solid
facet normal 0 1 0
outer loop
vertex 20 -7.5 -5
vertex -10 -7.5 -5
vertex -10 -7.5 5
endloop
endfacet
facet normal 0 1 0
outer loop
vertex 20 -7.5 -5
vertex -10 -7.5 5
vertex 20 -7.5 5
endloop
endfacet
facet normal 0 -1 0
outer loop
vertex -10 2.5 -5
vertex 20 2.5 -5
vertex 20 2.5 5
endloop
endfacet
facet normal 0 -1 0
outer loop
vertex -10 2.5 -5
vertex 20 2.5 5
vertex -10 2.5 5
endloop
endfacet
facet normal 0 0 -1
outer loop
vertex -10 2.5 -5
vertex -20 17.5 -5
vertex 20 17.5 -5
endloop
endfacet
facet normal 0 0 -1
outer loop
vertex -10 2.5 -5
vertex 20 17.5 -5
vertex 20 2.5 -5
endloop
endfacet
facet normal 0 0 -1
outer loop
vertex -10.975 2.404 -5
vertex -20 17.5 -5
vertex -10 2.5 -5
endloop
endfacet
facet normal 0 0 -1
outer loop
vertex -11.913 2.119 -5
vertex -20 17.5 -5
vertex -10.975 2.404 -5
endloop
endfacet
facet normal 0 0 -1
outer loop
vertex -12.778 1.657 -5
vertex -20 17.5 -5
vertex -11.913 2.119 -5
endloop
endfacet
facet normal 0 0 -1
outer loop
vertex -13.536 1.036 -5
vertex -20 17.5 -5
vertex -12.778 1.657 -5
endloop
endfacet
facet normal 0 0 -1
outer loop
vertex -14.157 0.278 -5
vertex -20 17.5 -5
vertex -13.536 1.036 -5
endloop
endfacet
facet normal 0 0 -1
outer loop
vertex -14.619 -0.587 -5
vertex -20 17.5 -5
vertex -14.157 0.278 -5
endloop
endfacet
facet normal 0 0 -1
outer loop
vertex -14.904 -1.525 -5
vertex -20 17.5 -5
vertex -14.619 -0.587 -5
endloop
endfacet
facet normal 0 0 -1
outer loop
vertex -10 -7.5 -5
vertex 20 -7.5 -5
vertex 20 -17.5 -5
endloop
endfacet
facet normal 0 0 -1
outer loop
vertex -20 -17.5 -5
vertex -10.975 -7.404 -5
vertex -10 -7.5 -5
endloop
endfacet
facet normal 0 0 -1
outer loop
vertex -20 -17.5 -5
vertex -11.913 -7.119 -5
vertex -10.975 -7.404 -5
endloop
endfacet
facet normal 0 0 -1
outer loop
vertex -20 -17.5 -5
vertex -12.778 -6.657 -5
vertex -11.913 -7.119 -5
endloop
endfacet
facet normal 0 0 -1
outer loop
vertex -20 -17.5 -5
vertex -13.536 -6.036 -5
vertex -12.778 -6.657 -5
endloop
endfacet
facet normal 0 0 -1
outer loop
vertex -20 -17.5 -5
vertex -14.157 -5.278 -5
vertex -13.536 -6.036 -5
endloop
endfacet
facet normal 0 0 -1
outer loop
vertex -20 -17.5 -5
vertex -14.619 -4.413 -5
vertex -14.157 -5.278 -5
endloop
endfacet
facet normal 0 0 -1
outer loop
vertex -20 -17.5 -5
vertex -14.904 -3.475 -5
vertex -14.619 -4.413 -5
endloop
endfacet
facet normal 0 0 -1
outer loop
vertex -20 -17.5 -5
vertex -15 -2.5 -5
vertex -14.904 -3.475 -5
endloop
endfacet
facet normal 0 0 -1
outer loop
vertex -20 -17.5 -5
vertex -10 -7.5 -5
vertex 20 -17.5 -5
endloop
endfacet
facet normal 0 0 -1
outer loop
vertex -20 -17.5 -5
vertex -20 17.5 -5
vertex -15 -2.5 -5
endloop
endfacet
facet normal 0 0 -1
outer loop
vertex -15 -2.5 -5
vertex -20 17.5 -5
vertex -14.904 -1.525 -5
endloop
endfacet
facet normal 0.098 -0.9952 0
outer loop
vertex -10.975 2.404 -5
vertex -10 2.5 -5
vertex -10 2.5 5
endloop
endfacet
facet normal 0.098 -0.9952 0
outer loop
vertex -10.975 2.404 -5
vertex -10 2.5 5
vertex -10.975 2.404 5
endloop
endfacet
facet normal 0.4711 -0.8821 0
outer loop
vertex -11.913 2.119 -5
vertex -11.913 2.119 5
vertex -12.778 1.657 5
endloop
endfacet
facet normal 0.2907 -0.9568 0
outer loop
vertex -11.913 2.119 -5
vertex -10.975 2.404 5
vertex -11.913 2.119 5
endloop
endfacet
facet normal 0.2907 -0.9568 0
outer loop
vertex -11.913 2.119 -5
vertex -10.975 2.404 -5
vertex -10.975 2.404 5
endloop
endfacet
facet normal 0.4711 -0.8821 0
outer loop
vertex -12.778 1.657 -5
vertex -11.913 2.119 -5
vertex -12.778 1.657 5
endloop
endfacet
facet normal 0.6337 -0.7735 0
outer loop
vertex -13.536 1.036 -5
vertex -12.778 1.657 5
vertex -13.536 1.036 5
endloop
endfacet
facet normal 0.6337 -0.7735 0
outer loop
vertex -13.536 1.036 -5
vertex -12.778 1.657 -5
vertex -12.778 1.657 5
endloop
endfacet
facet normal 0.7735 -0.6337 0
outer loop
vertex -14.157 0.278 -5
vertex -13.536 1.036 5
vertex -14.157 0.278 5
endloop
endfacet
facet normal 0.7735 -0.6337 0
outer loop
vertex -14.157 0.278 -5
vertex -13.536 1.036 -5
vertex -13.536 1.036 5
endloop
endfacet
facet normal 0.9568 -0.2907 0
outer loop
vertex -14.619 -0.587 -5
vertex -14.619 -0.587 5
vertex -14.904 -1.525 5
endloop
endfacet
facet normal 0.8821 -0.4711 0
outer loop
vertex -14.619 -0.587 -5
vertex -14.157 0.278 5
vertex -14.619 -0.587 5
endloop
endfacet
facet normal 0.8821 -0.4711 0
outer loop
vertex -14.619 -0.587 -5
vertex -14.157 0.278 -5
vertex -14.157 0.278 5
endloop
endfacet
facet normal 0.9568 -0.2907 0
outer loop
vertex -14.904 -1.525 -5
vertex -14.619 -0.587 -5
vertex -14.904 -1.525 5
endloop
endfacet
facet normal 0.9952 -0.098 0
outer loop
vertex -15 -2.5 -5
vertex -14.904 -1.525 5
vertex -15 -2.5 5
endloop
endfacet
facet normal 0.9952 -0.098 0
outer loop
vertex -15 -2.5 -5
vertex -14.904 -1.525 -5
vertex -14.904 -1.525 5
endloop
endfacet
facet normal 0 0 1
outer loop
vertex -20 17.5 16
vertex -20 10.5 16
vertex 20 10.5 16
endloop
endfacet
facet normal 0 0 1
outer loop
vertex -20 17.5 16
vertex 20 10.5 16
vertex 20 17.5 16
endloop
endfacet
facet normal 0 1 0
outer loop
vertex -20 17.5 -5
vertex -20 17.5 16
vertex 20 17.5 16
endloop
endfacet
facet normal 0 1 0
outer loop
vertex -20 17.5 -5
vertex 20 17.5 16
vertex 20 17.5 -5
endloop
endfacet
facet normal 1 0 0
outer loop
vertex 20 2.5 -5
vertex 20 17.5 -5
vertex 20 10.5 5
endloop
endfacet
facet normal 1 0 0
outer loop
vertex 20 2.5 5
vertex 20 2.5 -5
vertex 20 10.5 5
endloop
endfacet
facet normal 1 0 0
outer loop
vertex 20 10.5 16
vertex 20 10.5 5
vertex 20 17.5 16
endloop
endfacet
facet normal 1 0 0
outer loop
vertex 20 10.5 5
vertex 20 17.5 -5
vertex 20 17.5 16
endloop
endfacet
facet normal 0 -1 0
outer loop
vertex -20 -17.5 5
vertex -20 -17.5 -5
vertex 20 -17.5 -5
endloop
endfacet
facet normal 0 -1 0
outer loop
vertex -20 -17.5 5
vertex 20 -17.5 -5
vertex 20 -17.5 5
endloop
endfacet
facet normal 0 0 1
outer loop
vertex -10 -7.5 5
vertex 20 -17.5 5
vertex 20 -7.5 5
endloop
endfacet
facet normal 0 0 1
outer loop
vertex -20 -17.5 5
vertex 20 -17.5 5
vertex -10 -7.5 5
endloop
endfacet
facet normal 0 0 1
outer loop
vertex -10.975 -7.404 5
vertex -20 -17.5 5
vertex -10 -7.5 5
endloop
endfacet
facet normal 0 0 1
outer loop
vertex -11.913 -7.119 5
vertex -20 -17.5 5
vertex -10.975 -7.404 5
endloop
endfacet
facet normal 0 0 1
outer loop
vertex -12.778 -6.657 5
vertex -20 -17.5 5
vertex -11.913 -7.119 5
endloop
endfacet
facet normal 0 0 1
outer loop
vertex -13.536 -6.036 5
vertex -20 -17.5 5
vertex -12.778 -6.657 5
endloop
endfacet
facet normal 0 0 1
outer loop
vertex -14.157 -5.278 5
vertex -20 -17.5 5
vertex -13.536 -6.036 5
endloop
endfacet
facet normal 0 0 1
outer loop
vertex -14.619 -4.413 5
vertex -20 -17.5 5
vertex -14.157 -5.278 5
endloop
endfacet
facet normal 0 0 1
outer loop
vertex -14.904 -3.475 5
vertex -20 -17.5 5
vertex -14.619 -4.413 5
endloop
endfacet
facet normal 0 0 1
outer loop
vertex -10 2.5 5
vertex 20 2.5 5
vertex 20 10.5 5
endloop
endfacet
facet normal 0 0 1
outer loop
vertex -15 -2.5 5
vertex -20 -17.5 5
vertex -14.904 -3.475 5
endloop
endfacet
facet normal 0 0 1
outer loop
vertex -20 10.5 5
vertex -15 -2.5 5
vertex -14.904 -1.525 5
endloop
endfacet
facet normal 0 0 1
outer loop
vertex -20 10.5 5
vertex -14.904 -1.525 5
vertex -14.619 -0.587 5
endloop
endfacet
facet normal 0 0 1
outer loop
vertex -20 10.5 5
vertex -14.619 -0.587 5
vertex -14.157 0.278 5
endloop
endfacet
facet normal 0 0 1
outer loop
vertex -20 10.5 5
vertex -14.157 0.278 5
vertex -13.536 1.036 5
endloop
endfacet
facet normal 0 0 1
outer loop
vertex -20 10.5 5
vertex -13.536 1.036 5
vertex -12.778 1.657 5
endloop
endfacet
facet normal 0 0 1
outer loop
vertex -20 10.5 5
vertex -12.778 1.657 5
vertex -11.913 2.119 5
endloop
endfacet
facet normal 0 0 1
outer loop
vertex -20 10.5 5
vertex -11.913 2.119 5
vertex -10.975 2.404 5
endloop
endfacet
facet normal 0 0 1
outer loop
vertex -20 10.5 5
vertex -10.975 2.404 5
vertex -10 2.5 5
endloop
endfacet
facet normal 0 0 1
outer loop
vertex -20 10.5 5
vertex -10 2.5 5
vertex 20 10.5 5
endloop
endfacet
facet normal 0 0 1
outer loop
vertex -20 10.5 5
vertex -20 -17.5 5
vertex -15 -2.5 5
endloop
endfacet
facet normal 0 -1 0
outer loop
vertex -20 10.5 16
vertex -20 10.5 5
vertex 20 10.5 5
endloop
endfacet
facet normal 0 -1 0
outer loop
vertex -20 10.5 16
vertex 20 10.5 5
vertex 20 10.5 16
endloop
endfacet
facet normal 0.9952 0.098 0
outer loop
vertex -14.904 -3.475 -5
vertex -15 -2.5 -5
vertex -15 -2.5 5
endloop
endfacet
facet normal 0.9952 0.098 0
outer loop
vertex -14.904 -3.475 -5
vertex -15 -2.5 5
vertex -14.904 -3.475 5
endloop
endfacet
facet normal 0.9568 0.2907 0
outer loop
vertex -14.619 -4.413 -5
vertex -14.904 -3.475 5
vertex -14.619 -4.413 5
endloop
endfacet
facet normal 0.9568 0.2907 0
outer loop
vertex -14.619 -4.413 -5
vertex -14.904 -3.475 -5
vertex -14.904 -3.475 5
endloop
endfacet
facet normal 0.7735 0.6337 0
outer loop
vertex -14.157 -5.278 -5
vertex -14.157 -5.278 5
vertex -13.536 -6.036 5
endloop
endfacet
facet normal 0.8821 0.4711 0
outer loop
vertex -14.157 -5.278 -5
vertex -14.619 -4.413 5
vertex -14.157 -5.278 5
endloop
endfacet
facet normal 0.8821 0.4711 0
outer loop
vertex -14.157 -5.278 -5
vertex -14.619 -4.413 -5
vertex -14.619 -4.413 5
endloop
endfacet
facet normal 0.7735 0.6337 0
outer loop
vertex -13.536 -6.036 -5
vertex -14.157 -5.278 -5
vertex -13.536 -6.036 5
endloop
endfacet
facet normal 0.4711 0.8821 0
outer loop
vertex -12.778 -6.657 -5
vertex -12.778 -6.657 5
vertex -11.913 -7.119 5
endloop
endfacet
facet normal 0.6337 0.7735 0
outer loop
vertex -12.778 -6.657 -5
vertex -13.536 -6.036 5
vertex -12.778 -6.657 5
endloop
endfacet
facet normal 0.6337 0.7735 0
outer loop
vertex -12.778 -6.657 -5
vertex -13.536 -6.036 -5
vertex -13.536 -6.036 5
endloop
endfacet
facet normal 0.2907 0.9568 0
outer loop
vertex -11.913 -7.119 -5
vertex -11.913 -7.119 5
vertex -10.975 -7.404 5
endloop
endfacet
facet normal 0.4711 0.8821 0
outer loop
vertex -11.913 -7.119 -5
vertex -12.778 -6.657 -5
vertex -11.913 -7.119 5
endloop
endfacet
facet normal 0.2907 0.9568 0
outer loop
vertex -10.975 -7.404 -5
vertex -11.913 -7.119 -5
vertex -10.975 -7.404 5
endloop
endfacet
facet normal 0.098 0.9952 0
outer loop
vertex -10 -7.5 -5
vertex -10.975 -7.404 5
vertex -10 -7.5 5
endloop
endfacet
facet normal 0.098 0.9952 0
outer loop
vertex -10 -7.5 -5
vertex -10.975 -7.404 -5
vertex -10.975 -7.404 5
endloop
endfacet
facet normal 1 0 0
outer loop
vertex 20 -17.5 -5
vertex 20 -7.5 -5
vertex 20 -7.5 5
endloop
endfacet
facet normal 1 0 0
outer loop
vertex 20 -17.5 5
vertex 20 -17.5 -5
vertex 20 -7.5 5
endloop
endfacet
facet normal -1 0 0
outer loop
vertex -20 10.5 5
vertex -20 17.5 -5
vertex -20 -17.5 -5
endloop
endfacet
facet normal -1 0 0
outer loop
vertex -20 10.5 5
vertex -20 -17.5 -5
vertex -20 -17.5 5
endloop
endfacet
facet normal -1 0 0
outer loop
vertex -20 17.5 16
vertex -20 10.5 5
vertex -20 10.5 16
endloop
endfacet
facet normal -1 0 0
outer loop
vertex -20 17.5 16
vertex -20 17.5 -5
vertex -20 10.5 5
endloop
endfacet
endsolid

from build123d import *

# Parameters (mm, degrees)
BOSS_EXTRUDE1_DEPTH      = 20
BOSS_EXTRUDE1_DEPTH_BACK = 20
CUT_EXTRUDE1_DEPTH       = 32.020154738
CUT_EXTRUDE1_DEPTH_BACK  = 32.020154738


with BuildPart() as part:
    # Sketch1 → Boss-Extrude1 (new, two sides: drawn at the far end of the back side and taken through both)
    with BuildSketch(Plane(origin=(0, 0, 0), x_dir=(0, 0, -1), z_dir=(1, 0, 0)).offset(-BOSS_EXTRUDE1_DEPTH_BACK)):
        Polygon((-16, 17.5), (5, 17.5), (5, -17.5), (-5, -17.5), (-5, 10.5), (-16, 10.5), align=None)
    extrude(amount=BOSS_EXTRUDE1_DEPTH + BOSS_EXTRUDE1_DEPTH_BACK)

    # Sketch2 → Cut-Extrude1 (cut, two sides: drawn at the far end of the back side and taken through both)
    with BuildSketch(Plane.XY.offset(-CUT_EXTRUDE1_DEPTH_BACK)):
        with BuildLine():
            Line((20, 2.5), (-10, 2.5))
            ThreePointArc((-10, 2.5), (-15, -2.5), (-10, -7.5))
            Line((-10, -7.5), (20, -7.5))
            Line((20, -7.5), (20, 2.5))
        make_face()
    extrude(amount=CUT_EXTRUDE1_DEPTH + CUT_EXTRUDE1_DEPTH_BACK, mode=Mode.SUBTRACT)


solid = part.part
